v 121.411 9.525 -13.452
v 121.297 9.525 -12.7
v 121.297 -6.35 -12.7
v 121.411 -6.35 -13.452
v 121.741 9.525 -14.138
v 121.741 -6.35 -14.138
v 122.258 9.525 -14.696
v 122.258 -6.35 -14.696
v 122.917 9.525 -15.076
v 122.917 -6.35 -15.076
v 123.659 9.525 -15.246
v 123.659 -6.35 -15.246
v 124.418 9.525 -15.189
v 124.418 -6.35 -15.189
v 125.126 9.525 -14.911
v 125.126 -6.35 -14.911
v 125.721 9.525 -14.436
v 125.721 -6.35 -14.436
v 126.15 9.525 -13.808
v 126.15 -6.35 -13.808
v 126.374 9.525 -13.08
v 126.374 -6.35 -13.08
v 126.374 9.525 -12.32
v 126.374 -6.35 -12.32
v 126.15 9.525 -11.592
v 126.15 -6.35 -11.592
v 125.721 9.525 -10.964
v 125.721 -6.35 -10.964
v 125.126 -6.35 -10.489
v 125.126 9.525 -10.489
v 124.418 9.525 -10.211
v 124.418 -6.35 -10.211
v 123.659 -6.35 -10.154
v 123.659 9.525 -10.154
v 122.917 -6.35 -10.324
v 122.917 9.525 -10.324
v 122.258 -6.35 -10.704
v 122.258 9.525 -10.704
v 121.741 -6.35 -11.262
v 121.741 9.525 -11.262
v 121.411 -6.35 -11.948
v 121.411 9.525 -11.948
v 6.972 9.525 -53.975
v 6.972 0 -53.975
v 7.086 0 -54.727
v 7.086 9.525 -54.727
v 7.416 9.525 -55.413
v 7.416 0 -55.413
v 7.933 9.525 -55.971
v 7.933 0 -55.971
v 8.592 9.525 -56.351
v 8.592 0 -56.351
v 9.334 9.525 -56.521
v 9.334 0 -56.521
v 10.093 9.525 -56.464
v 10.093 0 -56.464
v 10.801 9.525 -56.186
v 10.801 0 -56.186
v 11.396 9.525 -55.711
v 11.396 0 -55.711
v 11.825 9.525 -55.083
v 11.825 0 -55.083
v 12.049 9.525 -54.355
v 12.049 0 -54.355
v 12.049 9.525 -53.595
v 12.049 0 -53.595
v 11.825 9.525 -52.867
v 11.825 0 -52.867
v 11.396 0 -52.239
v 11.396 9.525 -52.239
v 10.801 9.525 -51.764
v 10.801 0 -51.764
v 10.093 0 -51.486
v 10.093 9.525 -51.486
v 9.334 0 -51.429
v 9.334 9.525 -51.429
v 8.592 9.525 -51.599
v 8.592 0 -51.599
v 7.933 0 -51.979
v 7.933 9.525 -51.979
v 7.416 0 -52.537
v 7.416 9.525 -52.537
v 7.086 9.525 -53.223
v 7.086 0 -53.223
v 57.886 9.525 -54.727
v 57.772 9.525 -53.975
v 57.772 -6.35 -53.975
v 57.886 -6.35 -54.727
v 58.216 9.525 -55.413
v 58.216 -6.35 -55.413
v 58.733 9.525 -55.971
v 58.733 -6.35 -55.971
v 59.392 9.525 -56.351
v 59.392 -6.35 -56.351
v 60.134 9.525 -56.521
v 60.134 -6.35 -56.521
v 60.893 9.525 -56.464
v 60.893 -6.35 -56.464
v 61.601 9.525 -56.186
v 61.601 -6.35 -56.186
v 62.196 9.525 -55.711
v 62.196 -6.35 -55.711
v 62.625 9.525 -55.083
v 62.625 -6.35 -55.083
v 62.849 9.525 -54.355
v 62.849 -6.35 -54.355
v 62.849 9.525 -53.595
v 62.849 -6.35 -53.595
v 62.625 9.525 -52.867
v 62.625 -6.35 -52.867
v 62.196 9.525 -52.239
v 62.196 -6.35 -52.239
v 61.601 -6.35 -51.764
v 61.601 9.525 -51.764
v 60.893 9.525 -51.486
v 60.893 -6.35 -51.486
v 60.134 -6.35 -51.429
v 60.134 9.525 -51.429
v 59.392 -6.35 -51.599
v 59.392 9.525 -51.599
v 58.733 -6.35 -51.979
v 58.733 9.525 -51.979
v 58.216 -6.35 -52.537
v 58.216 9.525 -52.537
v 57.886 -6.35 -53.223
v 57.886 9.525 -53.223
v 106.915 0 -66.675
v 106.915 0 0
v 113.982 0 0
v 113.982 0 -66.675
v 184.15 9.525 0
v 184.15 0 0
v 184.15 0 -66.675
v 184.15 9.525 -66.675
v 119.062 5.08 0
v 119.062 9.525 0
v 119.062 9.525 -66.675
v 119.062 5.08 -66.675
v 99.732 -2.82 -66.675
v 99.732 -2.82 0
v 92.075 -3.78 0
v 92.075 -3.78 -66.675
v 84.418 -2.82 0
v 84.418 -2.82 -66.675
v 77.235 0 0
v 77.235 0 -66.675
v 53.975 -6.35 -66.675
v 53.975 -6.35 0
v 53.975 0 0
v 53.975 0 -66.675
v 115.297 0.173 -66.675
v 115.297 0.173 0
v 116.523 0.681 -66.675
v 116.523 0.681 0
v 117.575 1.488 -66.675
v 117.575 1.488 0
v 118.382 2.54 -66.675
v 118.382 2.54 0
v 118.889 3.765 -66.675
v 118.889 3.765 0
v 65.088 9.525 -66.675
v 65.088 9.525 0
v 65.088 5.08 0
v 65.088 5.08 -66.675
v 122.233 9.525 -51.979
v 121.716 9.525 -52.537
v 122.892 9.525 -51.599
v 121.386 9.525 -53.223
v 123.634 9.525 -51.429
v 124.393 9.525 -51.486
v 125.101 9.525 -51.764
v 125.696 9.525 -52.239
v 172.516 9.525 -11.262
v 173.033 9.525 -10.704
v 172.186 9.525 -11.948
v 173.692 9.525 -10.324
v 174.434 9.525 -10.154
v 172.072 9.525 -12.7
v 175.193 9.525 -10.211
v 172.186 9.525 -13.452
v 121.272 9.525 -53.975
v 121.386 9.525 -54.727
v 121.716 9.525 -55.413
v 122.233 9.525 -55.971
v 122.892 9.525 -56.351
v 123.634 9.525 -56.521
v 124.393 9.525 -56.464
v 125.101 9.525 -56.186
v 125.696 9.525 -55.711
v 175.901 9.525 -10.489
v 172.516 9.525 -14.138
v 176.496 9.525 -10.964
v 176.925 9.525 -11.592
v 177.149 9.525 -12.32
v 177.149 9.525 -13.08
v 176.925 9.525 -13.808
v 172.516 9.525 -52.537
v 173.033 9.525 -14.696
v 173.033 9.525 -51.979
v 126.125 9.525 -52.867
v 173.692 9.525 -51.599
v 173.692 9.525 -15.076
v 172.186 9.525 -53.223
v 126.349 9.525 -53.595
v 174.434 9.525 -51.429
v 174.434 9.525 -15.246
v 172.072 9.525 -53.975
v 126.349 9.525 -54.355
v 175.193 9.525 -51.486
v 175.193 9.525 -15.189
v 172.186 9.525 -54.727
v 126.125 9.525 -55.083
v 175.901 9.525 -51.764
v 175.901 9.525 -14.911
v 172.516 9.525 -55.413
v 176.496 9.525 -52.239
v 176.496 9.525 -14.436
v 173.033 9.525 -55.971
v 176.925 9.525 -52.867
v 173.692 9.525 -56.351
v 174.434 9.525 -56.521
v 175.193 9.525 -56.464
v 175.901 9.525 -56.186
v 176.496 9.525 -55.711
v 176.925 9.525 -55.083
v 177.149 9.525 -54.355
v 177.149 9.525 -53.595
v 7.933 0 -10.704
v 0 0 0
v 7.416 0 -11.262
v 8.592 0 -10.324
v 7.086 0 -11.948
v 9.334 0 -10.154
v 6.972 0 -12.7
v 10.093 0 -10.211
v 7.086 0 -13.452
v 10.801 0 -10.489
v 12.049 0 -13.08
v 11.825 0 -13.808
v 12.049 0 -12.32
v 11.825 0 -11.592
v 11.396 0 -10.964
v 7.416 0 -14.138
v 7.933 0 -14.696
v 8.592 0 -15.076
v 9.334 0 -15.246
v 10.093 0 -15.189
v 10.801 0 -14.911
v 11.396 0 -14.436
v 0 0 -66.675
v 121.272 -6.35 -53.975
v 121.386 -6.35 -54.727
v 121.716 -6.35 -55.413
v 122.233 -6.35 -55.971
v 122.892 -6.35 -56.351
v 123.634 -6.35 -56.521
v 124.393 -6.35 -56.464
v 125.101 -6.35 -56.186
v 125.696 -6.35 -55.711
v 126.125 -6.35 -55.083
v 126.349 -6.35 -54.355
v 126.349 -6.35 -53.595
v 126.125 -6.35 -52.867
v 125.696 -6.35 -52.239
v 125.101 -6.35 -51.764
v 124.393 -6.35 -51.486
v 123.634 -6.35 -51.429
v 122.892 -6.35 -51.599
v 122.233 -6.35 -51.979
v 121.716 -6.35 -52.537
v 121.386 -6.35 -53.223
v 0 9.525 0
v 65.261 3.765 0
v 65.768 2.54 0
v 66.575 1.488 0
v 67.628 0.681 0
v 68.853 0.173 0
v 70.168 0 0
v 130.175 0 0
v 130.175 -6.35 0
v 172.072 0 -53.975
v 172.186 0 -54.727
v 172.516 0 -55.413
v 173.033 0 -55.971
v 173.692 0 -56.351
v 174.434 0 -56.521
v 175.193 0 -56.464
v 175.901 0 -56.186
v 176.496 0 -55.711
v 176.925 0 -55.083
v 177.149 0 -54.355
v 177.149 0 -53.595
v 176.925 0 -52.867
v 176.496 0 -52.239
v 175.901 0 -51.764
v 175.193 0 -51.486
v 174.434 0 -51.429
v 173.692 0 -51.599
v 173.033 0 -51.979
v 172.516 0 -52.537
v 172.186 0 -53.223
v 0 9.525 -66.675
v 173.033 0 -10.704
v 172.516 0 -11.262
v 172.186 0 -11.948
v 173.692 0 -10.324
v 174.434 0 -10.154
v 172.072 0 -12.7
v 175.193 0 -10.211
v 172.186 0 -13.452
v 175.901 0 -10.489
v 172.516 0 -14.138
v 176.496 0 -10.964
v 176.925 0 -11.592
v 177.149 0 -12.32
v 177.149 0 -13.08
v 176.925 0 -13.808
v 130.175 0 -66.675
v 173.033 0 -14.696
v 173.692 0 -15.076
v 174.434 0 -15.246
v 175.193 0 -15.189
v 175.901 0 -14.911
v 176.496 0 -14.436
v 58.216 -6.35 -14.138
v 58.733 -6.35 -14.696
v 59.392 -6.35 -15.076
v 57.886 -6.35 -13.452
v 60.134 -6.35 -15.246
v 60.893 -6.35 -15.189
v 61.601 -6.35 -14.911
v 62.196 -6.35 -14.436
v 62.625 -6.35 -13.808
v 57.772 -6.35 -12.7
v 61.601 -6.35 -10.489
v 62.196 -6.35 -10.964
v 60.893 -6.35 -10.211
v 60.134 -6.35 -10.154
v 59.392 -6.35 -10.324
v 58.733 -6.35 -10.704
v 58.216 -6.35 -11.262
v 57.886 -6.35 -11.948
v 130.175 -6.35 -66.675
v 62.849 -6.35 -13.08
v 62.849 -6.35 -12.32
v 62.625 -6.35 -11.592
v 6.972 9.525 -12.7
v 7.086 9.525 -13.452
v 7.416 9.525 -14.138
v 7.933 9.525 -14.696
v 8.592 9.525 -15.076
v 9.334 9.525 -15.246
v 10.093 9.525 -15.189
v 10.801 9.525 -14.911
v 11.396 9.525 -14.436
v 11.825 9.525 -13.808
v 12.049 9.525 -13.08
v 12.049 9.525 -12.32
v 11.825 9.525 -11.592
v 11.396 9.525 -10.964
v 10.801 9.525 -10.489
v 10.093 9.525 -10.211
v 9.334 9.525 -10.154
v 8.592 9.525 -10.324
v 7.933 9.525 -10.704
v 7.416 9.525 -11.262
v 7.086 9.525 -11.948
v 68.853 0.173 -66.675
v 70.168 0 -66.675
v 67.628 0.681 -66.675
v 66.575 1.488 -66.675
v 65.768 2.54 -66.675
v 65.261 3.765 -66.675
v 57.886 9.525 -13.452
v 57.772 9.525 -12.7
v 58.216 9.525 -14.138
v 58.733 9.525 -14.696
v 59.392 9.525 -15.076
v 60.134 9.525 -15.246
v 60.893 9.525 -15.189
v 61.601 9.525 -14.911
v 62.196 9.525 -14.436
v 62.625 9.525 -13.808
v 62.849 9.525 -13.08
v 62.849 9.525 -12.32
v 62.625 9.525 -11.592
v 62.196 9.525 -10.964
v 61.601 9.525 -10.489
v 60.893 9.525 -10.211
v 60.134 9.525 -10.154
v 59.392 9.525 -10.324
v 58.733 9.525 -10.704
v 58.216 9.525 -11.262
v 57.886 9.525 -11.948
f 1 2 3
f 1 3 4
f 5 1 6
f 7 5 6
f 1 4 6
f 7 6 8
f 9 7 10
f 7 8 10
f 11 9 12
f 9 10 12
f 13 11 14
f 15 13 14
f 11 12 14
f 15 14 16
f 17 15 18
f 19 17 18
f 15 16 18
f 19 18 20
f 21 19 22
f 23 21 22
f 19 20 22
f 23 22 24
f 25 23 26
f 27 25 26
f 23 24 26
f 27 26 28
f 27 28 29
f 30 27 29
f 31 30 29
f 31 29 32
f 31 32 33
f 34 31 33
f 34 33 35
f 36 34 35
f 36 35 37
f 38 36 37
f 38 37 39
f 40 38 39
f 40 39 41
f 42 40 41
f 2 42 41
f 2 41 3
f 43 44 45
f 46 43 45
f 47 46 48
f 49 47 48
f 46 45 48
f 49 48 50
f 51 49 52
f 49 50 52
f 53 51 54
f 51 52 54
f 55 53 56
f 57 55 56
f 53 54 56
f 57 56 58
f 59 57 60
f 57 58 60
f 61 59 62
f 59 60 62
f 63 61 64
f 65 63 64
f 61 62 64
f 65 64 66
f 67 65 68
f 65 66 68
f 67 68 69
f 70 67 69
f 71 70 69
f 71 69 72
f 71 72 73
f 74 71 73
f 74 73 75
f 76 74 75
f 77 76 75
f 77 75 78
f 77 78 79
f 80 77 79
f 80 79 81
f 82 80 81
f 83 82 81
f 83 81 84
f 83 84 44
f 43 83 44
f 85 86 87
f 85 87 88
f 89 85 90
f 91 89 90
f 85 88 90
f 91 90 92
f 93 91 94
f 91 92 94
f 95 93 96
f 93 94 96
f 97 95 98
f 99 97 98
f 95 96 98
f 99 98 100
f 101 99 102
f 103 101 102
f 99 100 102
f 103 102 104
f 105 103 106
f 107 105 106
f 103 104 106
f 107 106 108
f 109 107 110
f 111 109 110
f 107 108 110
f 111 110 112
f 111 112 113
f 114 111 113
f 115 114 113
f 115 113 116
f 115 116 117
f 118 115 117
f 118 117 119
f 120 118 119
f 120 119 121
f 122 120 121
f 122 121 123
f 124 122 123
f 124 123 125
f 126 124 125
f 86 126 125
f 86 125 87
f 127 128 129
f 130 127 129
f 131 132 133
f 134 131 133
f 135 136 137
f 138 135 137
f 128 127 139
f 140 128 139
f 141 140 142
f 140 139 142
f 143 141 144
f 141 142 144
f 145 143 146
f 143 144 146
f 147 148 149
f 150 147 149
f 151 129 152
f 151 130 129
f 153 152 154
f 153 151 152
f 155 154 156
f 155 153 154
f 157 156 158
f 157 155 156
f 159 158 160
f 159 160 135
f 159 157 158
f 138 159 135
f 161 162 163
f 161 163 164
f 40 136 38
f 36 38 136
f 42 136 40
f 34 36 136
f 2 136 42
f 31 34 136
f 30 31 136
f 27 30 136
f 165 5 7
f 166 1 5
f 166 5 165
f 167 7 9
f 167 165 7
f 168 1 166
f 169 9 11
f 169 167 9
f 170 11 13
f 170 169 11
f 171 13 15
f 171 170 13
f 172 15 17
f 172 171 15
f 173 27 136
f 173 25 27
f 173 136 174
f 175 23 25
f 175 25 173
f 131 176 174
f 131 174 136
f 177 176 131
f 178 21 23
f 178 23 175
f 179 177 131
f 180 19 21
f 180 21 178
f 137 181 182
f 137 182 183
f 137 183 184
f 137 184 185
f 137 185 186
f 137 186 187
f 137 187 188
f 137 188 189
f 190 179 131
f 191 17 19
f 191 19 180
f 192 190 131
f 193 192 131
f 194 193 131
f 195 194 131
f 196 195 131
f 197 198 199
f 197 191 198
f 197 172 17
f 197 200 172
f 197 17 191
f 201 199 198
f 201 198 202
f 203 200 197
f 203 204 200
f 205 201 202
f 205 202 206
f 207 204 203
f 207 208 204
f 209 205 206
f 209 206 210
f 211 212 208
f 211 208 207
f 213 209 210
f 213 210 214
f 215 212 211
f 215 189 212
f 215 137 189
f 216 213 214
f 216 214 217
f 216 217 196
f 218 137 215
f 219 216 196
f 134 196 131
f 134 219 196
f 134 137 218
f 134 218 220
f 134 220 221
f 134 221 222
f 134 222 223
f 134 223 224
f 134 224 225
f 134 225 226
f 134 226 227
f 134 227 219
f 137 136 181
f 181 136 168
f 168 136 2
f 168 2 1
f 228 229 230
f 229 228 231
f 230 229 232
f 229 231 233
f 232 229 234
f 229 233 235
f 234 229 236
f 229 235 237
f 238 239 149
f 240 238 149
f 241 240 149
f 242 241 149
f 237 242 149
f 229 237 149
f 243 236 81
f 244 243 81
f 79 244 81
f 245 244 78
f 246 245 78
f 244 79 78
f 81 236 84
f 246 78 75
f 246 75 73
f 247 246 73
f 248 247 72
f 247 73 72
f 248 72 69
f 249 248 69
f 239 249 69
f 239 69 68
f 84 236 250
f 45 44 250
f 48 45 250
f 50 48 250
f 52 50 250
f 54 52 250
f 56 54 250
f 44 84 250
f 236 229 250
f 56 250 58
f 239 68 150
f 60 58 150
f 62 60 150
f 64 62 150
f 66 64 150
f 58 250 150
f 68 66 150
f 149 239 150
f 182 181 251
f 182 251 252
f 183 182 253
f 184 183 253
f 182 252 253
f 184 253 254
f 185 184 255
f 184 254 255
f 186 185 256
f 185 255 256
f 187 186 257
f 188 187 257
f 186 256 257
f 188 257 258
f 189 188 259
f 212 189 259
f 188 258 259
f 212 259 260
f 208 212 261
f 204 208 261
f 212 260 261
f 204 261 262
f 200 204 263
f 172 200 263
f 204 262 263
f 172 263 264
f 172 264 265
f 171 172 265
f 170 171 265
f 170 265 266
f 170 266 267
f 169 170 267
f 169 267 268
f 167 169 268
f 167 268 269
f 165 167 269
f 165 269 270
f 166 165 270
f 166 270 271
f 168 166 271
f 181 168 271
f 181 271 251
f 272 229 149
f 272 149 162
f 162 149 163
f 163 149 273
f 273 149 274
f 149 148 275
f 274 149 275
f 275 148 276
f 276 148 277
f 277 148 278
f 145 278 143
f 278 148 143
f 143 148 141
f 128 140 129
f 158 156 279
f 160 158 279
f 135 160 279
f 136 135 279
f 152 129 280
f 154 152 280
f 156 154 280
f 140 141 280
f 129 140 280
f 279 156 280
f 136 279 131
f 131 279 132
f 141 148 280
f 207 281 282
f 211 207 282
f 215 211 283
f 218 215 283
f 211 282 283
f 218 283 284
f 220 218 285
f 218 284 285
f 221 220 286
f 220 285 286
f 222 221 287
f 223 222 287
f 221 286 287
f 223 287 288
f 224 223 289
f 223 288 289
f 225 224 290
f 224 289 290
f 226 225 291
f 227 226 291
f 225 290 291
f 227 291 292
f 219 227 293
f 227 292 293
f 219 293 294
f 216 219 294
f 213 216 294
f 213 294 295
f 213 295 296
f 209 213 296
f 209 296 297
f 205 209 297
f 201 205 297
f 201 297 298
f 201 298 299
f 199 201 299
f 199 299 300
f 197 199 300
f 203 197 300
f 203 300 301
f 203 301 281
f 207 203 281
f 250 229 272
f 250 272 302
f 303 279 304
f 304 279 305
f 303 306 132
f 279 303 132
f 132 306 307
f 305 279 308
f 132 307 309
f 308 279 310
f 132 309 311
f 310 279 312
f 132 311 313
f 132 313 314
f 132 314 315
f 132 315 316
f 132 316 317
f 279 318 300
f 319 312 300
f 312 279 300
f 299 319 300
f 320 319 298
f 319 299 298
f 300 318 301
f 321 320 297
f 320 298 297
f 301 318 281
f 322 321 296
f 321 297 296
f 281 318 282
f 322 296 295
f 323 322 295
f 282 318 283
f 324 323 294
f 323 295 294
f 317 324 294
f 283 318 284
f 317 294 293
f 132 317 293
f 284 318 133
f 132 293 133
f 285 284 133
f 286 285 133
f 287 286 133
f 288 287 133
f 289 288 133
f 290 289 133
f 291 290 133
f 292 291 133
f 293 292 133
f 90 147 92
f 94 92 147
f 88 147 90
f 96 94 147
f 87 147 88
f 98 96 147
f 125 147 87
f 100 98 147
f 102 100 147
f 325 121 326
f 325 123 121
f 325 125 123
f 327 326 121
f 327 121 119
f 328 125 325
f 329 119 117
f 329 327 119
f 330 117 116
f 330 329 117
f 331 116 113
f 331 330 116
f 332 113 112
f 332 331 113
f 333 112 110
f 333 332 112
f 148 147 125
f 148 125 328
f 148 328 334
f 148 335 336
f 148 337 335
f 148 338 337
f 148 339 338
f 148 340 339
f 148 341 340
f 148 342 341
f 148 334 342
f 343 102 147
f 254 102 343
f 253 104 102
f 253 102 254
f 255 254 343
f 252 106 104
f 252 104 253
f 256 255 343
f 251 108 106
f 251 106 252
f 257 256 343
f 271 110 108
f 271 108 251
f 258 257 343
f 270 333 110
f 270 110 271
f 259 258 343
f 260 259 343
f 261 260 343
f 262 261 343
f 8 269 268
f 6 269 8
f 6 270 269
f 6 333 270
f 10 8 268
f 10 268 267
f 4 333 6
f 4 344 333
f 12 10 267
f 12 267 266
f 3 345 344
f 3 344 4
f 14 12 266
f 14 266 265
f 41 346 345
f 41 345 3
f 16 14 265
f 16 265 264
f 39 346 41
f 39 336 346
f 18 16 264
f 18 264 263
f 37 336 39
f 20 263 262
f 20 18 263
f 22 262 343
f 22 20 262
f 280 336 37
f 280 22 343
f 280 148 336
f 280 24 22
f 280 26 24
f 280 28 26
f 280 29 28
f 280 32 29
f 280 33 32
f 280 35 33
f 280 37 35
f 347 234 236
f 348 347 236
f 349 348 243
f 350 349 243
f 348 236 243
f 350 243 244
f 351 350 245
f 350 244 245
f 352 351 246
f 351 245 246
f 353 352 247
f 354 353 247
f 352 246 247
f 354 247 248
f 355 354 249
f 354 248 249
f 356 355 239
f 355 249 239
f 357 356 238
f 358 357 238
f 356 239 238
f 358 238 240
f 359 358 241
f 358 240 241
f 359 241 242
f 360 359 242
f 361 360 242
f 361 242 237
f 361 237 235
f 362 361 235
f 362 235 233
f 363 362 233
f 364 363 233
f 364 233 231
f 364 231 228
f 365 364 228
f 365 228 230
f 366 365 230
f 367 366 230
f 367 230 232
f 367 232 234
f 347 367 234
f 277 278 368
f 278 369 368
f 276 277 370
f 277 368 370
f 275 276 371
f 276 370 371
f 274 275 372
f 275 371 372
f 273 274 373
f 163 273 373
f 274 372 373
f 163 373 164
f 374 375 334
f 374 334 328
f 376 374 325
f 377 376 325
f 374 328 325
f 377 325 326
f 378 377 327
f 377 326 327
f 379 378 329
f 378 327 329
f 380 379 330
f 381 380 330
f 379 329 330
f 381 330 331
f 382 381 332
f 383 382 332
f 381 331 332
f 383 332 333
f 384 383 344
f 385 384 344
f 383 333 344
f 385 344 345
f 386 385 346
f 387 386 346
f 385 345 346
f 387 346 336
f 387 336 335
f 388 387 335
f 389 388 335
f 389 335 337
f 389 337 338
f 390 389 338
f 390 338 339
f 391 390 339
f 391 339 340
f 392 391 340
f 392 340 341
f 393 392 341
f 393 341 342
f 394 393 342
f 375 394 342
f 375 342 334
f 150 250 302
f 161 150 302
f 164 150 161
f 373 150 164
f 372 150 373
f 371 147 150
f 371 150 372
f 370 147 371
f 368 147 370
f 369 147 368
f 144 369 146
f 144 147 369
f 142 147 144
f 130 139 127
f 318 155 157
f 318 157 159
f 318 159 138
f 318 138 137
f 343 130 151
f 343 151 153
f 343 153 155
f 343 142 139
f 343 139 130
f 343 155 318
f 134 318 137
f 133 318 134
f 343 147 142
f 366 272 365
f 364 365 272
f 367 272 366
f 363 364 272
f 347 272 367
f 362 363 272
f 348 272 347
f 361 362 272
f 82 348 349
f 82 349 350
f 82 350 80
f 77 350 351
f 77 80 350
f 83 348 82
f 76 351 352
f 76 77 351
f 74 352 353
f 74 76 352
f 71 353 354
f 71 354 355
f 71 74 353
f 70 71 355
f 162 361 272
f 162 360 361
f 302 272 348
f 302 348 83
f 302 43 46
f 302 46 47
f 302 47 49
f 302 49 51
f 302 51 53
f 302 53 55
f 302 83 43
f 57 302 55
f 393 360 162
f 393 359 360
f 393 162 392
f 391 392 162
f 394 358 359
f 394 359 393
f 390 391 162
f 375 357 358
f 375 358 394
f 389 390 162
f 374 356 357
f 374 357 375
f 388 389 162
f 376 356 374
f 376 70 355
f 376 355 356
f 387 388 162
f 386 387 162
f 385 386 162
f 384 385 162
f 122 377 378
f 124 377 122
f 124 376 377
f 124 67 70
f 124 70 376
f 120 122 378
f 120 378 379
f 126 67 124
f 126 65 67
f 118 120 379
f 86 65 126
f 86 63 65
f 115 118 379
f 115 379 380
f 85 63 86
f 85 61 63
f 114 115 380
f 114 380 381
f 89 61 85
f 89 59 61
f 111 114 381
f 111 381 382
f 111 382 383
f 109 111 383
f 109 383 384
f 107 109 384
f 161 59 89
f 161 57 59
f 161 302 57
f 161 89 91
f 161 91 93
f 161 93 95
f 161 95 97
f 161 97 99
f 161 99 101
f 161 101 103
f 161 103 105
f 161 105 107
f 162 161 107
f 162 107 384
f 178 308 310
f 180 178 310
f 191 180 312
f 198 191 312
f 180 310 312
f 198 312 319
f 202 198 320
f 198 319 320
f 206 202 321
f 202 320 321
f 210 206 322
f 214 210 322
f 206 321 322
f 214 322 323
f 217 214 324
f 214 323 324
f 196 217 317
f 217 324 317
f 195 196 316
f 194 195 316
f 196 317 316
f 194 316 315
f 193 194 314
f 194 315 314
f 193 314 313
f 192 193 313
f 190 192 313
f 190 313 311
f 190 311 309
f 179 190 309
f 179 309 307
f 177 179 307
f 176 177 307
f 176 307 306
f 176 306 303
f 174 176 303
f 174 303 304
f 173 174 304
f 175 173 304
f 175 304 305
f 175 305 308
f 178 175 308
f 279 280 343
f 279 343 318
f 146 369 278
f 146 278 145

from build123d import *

# Parameters (mm, degrees)
SKETCH1_W              = 184.15
SKETCH1_H              = 66.675
BOSS_EXTRUDE1_DEPTH    = 9.525
SKETCH4_W              = 76.2
SKETCH4_H              = 6.35
BOSS_EXTRUDE2_DEPTH    = 66.675
SKETCH5_W              = 53.975
SKETCH5_H              = 66.675
CUT_EXTRUDE1_DEPTH     = 9.525
F_10_CLEARANCE_HOLE1_D = 5.1054
SKETCH12_R             = 31.019294643
CUT_EXTRUDE3_DEPTH     = 197.080350239
FILLET8_R              = 5.08
FILLET9_R              = 5.08


with BuildPart() as part:
    # Sketch1 → Boss-Extrude1 (new body)
    with BuildSketch(Plane(origin=(0, 0, 0), x_dir=(1, 0, 0), z_dir=(0, 1, 0))):
        with Locations((92.075, 33.3375)):
            Rectangle(SKETCH1_W, SKETCH1_H)
    extrude(amount=BOSS_EXTRUDE1_DEPTH)

    # Sketch4 → Boss-Extrude2 (add)
    with BuildSketch(Plane.XY):
        with Locations((92.075, -3.175)):
            Rectangle(SKETCH4_W, SKETCH4_H)
    extrude(amount=-BOSS_EXTRUDE2_DEPTH)

    # Sketch5 → Cut-Extrude1 (cut)
    with BuildSketch(Plane(origin=(0, 9.525, 0), x_dir=(1, 0, 0), z_dir=(0, 1, 0))):
        with Locations((92.075, 33.3375)):
            Rectangle(SKETCH5_W, SKETCH5_H)
    extrude(amount=-CUT_EXTRUDE1_DEPTH, mode=Mode.SUBTRACT)

    # #10 Clearance Hole1 (through all)
    with Locations(Plane(origin=(0, 9.525, 0), x_dir=(1, 0, 0), z_dir=(0, 1, 0))):
        with Locations((9.525, 53.975), (9.525, 12.7), (60.325, 12.7), (60.325, 53.975), (123.825, 53.975), (123.849810746, 12.7), (174.625, 12.7), (174.625, 53.975)):
            Hole(F_10_CLEARANCE_HOLE1_D / 2)

    # Sketch12 → Cut-Extrude3 (cut, through all)
    with BuildSketch(Plane(origin=(0, 0, -66.675), x_dir=(-1, 0, 0), z_dir=(0, 0, -1))):
        with Locations((-92.075, 27.239371317)):
            Circle(SKETCH12_R)
    extrude(amount=-CUT_EXTRUDE3_DEPTH, mode=Mode.SUBTRACT)

    # Fillet8
    fillet8_edges = [part.edges().sort_by_distance(p)[0] for p in [
        (65.0875, 0, -33.3375),
    ]]
    fillet(fillet8_edges, radius=FILLET8_R)

    # Fillet9
    fillet9_edges = [part.edges().sort_by_distance(p)[0] for p in [
        (119.0625, 0, -33.3375),
    ]]
    fillet(fillet9_edges, radius=FILLET9_R)


solid = part.part
